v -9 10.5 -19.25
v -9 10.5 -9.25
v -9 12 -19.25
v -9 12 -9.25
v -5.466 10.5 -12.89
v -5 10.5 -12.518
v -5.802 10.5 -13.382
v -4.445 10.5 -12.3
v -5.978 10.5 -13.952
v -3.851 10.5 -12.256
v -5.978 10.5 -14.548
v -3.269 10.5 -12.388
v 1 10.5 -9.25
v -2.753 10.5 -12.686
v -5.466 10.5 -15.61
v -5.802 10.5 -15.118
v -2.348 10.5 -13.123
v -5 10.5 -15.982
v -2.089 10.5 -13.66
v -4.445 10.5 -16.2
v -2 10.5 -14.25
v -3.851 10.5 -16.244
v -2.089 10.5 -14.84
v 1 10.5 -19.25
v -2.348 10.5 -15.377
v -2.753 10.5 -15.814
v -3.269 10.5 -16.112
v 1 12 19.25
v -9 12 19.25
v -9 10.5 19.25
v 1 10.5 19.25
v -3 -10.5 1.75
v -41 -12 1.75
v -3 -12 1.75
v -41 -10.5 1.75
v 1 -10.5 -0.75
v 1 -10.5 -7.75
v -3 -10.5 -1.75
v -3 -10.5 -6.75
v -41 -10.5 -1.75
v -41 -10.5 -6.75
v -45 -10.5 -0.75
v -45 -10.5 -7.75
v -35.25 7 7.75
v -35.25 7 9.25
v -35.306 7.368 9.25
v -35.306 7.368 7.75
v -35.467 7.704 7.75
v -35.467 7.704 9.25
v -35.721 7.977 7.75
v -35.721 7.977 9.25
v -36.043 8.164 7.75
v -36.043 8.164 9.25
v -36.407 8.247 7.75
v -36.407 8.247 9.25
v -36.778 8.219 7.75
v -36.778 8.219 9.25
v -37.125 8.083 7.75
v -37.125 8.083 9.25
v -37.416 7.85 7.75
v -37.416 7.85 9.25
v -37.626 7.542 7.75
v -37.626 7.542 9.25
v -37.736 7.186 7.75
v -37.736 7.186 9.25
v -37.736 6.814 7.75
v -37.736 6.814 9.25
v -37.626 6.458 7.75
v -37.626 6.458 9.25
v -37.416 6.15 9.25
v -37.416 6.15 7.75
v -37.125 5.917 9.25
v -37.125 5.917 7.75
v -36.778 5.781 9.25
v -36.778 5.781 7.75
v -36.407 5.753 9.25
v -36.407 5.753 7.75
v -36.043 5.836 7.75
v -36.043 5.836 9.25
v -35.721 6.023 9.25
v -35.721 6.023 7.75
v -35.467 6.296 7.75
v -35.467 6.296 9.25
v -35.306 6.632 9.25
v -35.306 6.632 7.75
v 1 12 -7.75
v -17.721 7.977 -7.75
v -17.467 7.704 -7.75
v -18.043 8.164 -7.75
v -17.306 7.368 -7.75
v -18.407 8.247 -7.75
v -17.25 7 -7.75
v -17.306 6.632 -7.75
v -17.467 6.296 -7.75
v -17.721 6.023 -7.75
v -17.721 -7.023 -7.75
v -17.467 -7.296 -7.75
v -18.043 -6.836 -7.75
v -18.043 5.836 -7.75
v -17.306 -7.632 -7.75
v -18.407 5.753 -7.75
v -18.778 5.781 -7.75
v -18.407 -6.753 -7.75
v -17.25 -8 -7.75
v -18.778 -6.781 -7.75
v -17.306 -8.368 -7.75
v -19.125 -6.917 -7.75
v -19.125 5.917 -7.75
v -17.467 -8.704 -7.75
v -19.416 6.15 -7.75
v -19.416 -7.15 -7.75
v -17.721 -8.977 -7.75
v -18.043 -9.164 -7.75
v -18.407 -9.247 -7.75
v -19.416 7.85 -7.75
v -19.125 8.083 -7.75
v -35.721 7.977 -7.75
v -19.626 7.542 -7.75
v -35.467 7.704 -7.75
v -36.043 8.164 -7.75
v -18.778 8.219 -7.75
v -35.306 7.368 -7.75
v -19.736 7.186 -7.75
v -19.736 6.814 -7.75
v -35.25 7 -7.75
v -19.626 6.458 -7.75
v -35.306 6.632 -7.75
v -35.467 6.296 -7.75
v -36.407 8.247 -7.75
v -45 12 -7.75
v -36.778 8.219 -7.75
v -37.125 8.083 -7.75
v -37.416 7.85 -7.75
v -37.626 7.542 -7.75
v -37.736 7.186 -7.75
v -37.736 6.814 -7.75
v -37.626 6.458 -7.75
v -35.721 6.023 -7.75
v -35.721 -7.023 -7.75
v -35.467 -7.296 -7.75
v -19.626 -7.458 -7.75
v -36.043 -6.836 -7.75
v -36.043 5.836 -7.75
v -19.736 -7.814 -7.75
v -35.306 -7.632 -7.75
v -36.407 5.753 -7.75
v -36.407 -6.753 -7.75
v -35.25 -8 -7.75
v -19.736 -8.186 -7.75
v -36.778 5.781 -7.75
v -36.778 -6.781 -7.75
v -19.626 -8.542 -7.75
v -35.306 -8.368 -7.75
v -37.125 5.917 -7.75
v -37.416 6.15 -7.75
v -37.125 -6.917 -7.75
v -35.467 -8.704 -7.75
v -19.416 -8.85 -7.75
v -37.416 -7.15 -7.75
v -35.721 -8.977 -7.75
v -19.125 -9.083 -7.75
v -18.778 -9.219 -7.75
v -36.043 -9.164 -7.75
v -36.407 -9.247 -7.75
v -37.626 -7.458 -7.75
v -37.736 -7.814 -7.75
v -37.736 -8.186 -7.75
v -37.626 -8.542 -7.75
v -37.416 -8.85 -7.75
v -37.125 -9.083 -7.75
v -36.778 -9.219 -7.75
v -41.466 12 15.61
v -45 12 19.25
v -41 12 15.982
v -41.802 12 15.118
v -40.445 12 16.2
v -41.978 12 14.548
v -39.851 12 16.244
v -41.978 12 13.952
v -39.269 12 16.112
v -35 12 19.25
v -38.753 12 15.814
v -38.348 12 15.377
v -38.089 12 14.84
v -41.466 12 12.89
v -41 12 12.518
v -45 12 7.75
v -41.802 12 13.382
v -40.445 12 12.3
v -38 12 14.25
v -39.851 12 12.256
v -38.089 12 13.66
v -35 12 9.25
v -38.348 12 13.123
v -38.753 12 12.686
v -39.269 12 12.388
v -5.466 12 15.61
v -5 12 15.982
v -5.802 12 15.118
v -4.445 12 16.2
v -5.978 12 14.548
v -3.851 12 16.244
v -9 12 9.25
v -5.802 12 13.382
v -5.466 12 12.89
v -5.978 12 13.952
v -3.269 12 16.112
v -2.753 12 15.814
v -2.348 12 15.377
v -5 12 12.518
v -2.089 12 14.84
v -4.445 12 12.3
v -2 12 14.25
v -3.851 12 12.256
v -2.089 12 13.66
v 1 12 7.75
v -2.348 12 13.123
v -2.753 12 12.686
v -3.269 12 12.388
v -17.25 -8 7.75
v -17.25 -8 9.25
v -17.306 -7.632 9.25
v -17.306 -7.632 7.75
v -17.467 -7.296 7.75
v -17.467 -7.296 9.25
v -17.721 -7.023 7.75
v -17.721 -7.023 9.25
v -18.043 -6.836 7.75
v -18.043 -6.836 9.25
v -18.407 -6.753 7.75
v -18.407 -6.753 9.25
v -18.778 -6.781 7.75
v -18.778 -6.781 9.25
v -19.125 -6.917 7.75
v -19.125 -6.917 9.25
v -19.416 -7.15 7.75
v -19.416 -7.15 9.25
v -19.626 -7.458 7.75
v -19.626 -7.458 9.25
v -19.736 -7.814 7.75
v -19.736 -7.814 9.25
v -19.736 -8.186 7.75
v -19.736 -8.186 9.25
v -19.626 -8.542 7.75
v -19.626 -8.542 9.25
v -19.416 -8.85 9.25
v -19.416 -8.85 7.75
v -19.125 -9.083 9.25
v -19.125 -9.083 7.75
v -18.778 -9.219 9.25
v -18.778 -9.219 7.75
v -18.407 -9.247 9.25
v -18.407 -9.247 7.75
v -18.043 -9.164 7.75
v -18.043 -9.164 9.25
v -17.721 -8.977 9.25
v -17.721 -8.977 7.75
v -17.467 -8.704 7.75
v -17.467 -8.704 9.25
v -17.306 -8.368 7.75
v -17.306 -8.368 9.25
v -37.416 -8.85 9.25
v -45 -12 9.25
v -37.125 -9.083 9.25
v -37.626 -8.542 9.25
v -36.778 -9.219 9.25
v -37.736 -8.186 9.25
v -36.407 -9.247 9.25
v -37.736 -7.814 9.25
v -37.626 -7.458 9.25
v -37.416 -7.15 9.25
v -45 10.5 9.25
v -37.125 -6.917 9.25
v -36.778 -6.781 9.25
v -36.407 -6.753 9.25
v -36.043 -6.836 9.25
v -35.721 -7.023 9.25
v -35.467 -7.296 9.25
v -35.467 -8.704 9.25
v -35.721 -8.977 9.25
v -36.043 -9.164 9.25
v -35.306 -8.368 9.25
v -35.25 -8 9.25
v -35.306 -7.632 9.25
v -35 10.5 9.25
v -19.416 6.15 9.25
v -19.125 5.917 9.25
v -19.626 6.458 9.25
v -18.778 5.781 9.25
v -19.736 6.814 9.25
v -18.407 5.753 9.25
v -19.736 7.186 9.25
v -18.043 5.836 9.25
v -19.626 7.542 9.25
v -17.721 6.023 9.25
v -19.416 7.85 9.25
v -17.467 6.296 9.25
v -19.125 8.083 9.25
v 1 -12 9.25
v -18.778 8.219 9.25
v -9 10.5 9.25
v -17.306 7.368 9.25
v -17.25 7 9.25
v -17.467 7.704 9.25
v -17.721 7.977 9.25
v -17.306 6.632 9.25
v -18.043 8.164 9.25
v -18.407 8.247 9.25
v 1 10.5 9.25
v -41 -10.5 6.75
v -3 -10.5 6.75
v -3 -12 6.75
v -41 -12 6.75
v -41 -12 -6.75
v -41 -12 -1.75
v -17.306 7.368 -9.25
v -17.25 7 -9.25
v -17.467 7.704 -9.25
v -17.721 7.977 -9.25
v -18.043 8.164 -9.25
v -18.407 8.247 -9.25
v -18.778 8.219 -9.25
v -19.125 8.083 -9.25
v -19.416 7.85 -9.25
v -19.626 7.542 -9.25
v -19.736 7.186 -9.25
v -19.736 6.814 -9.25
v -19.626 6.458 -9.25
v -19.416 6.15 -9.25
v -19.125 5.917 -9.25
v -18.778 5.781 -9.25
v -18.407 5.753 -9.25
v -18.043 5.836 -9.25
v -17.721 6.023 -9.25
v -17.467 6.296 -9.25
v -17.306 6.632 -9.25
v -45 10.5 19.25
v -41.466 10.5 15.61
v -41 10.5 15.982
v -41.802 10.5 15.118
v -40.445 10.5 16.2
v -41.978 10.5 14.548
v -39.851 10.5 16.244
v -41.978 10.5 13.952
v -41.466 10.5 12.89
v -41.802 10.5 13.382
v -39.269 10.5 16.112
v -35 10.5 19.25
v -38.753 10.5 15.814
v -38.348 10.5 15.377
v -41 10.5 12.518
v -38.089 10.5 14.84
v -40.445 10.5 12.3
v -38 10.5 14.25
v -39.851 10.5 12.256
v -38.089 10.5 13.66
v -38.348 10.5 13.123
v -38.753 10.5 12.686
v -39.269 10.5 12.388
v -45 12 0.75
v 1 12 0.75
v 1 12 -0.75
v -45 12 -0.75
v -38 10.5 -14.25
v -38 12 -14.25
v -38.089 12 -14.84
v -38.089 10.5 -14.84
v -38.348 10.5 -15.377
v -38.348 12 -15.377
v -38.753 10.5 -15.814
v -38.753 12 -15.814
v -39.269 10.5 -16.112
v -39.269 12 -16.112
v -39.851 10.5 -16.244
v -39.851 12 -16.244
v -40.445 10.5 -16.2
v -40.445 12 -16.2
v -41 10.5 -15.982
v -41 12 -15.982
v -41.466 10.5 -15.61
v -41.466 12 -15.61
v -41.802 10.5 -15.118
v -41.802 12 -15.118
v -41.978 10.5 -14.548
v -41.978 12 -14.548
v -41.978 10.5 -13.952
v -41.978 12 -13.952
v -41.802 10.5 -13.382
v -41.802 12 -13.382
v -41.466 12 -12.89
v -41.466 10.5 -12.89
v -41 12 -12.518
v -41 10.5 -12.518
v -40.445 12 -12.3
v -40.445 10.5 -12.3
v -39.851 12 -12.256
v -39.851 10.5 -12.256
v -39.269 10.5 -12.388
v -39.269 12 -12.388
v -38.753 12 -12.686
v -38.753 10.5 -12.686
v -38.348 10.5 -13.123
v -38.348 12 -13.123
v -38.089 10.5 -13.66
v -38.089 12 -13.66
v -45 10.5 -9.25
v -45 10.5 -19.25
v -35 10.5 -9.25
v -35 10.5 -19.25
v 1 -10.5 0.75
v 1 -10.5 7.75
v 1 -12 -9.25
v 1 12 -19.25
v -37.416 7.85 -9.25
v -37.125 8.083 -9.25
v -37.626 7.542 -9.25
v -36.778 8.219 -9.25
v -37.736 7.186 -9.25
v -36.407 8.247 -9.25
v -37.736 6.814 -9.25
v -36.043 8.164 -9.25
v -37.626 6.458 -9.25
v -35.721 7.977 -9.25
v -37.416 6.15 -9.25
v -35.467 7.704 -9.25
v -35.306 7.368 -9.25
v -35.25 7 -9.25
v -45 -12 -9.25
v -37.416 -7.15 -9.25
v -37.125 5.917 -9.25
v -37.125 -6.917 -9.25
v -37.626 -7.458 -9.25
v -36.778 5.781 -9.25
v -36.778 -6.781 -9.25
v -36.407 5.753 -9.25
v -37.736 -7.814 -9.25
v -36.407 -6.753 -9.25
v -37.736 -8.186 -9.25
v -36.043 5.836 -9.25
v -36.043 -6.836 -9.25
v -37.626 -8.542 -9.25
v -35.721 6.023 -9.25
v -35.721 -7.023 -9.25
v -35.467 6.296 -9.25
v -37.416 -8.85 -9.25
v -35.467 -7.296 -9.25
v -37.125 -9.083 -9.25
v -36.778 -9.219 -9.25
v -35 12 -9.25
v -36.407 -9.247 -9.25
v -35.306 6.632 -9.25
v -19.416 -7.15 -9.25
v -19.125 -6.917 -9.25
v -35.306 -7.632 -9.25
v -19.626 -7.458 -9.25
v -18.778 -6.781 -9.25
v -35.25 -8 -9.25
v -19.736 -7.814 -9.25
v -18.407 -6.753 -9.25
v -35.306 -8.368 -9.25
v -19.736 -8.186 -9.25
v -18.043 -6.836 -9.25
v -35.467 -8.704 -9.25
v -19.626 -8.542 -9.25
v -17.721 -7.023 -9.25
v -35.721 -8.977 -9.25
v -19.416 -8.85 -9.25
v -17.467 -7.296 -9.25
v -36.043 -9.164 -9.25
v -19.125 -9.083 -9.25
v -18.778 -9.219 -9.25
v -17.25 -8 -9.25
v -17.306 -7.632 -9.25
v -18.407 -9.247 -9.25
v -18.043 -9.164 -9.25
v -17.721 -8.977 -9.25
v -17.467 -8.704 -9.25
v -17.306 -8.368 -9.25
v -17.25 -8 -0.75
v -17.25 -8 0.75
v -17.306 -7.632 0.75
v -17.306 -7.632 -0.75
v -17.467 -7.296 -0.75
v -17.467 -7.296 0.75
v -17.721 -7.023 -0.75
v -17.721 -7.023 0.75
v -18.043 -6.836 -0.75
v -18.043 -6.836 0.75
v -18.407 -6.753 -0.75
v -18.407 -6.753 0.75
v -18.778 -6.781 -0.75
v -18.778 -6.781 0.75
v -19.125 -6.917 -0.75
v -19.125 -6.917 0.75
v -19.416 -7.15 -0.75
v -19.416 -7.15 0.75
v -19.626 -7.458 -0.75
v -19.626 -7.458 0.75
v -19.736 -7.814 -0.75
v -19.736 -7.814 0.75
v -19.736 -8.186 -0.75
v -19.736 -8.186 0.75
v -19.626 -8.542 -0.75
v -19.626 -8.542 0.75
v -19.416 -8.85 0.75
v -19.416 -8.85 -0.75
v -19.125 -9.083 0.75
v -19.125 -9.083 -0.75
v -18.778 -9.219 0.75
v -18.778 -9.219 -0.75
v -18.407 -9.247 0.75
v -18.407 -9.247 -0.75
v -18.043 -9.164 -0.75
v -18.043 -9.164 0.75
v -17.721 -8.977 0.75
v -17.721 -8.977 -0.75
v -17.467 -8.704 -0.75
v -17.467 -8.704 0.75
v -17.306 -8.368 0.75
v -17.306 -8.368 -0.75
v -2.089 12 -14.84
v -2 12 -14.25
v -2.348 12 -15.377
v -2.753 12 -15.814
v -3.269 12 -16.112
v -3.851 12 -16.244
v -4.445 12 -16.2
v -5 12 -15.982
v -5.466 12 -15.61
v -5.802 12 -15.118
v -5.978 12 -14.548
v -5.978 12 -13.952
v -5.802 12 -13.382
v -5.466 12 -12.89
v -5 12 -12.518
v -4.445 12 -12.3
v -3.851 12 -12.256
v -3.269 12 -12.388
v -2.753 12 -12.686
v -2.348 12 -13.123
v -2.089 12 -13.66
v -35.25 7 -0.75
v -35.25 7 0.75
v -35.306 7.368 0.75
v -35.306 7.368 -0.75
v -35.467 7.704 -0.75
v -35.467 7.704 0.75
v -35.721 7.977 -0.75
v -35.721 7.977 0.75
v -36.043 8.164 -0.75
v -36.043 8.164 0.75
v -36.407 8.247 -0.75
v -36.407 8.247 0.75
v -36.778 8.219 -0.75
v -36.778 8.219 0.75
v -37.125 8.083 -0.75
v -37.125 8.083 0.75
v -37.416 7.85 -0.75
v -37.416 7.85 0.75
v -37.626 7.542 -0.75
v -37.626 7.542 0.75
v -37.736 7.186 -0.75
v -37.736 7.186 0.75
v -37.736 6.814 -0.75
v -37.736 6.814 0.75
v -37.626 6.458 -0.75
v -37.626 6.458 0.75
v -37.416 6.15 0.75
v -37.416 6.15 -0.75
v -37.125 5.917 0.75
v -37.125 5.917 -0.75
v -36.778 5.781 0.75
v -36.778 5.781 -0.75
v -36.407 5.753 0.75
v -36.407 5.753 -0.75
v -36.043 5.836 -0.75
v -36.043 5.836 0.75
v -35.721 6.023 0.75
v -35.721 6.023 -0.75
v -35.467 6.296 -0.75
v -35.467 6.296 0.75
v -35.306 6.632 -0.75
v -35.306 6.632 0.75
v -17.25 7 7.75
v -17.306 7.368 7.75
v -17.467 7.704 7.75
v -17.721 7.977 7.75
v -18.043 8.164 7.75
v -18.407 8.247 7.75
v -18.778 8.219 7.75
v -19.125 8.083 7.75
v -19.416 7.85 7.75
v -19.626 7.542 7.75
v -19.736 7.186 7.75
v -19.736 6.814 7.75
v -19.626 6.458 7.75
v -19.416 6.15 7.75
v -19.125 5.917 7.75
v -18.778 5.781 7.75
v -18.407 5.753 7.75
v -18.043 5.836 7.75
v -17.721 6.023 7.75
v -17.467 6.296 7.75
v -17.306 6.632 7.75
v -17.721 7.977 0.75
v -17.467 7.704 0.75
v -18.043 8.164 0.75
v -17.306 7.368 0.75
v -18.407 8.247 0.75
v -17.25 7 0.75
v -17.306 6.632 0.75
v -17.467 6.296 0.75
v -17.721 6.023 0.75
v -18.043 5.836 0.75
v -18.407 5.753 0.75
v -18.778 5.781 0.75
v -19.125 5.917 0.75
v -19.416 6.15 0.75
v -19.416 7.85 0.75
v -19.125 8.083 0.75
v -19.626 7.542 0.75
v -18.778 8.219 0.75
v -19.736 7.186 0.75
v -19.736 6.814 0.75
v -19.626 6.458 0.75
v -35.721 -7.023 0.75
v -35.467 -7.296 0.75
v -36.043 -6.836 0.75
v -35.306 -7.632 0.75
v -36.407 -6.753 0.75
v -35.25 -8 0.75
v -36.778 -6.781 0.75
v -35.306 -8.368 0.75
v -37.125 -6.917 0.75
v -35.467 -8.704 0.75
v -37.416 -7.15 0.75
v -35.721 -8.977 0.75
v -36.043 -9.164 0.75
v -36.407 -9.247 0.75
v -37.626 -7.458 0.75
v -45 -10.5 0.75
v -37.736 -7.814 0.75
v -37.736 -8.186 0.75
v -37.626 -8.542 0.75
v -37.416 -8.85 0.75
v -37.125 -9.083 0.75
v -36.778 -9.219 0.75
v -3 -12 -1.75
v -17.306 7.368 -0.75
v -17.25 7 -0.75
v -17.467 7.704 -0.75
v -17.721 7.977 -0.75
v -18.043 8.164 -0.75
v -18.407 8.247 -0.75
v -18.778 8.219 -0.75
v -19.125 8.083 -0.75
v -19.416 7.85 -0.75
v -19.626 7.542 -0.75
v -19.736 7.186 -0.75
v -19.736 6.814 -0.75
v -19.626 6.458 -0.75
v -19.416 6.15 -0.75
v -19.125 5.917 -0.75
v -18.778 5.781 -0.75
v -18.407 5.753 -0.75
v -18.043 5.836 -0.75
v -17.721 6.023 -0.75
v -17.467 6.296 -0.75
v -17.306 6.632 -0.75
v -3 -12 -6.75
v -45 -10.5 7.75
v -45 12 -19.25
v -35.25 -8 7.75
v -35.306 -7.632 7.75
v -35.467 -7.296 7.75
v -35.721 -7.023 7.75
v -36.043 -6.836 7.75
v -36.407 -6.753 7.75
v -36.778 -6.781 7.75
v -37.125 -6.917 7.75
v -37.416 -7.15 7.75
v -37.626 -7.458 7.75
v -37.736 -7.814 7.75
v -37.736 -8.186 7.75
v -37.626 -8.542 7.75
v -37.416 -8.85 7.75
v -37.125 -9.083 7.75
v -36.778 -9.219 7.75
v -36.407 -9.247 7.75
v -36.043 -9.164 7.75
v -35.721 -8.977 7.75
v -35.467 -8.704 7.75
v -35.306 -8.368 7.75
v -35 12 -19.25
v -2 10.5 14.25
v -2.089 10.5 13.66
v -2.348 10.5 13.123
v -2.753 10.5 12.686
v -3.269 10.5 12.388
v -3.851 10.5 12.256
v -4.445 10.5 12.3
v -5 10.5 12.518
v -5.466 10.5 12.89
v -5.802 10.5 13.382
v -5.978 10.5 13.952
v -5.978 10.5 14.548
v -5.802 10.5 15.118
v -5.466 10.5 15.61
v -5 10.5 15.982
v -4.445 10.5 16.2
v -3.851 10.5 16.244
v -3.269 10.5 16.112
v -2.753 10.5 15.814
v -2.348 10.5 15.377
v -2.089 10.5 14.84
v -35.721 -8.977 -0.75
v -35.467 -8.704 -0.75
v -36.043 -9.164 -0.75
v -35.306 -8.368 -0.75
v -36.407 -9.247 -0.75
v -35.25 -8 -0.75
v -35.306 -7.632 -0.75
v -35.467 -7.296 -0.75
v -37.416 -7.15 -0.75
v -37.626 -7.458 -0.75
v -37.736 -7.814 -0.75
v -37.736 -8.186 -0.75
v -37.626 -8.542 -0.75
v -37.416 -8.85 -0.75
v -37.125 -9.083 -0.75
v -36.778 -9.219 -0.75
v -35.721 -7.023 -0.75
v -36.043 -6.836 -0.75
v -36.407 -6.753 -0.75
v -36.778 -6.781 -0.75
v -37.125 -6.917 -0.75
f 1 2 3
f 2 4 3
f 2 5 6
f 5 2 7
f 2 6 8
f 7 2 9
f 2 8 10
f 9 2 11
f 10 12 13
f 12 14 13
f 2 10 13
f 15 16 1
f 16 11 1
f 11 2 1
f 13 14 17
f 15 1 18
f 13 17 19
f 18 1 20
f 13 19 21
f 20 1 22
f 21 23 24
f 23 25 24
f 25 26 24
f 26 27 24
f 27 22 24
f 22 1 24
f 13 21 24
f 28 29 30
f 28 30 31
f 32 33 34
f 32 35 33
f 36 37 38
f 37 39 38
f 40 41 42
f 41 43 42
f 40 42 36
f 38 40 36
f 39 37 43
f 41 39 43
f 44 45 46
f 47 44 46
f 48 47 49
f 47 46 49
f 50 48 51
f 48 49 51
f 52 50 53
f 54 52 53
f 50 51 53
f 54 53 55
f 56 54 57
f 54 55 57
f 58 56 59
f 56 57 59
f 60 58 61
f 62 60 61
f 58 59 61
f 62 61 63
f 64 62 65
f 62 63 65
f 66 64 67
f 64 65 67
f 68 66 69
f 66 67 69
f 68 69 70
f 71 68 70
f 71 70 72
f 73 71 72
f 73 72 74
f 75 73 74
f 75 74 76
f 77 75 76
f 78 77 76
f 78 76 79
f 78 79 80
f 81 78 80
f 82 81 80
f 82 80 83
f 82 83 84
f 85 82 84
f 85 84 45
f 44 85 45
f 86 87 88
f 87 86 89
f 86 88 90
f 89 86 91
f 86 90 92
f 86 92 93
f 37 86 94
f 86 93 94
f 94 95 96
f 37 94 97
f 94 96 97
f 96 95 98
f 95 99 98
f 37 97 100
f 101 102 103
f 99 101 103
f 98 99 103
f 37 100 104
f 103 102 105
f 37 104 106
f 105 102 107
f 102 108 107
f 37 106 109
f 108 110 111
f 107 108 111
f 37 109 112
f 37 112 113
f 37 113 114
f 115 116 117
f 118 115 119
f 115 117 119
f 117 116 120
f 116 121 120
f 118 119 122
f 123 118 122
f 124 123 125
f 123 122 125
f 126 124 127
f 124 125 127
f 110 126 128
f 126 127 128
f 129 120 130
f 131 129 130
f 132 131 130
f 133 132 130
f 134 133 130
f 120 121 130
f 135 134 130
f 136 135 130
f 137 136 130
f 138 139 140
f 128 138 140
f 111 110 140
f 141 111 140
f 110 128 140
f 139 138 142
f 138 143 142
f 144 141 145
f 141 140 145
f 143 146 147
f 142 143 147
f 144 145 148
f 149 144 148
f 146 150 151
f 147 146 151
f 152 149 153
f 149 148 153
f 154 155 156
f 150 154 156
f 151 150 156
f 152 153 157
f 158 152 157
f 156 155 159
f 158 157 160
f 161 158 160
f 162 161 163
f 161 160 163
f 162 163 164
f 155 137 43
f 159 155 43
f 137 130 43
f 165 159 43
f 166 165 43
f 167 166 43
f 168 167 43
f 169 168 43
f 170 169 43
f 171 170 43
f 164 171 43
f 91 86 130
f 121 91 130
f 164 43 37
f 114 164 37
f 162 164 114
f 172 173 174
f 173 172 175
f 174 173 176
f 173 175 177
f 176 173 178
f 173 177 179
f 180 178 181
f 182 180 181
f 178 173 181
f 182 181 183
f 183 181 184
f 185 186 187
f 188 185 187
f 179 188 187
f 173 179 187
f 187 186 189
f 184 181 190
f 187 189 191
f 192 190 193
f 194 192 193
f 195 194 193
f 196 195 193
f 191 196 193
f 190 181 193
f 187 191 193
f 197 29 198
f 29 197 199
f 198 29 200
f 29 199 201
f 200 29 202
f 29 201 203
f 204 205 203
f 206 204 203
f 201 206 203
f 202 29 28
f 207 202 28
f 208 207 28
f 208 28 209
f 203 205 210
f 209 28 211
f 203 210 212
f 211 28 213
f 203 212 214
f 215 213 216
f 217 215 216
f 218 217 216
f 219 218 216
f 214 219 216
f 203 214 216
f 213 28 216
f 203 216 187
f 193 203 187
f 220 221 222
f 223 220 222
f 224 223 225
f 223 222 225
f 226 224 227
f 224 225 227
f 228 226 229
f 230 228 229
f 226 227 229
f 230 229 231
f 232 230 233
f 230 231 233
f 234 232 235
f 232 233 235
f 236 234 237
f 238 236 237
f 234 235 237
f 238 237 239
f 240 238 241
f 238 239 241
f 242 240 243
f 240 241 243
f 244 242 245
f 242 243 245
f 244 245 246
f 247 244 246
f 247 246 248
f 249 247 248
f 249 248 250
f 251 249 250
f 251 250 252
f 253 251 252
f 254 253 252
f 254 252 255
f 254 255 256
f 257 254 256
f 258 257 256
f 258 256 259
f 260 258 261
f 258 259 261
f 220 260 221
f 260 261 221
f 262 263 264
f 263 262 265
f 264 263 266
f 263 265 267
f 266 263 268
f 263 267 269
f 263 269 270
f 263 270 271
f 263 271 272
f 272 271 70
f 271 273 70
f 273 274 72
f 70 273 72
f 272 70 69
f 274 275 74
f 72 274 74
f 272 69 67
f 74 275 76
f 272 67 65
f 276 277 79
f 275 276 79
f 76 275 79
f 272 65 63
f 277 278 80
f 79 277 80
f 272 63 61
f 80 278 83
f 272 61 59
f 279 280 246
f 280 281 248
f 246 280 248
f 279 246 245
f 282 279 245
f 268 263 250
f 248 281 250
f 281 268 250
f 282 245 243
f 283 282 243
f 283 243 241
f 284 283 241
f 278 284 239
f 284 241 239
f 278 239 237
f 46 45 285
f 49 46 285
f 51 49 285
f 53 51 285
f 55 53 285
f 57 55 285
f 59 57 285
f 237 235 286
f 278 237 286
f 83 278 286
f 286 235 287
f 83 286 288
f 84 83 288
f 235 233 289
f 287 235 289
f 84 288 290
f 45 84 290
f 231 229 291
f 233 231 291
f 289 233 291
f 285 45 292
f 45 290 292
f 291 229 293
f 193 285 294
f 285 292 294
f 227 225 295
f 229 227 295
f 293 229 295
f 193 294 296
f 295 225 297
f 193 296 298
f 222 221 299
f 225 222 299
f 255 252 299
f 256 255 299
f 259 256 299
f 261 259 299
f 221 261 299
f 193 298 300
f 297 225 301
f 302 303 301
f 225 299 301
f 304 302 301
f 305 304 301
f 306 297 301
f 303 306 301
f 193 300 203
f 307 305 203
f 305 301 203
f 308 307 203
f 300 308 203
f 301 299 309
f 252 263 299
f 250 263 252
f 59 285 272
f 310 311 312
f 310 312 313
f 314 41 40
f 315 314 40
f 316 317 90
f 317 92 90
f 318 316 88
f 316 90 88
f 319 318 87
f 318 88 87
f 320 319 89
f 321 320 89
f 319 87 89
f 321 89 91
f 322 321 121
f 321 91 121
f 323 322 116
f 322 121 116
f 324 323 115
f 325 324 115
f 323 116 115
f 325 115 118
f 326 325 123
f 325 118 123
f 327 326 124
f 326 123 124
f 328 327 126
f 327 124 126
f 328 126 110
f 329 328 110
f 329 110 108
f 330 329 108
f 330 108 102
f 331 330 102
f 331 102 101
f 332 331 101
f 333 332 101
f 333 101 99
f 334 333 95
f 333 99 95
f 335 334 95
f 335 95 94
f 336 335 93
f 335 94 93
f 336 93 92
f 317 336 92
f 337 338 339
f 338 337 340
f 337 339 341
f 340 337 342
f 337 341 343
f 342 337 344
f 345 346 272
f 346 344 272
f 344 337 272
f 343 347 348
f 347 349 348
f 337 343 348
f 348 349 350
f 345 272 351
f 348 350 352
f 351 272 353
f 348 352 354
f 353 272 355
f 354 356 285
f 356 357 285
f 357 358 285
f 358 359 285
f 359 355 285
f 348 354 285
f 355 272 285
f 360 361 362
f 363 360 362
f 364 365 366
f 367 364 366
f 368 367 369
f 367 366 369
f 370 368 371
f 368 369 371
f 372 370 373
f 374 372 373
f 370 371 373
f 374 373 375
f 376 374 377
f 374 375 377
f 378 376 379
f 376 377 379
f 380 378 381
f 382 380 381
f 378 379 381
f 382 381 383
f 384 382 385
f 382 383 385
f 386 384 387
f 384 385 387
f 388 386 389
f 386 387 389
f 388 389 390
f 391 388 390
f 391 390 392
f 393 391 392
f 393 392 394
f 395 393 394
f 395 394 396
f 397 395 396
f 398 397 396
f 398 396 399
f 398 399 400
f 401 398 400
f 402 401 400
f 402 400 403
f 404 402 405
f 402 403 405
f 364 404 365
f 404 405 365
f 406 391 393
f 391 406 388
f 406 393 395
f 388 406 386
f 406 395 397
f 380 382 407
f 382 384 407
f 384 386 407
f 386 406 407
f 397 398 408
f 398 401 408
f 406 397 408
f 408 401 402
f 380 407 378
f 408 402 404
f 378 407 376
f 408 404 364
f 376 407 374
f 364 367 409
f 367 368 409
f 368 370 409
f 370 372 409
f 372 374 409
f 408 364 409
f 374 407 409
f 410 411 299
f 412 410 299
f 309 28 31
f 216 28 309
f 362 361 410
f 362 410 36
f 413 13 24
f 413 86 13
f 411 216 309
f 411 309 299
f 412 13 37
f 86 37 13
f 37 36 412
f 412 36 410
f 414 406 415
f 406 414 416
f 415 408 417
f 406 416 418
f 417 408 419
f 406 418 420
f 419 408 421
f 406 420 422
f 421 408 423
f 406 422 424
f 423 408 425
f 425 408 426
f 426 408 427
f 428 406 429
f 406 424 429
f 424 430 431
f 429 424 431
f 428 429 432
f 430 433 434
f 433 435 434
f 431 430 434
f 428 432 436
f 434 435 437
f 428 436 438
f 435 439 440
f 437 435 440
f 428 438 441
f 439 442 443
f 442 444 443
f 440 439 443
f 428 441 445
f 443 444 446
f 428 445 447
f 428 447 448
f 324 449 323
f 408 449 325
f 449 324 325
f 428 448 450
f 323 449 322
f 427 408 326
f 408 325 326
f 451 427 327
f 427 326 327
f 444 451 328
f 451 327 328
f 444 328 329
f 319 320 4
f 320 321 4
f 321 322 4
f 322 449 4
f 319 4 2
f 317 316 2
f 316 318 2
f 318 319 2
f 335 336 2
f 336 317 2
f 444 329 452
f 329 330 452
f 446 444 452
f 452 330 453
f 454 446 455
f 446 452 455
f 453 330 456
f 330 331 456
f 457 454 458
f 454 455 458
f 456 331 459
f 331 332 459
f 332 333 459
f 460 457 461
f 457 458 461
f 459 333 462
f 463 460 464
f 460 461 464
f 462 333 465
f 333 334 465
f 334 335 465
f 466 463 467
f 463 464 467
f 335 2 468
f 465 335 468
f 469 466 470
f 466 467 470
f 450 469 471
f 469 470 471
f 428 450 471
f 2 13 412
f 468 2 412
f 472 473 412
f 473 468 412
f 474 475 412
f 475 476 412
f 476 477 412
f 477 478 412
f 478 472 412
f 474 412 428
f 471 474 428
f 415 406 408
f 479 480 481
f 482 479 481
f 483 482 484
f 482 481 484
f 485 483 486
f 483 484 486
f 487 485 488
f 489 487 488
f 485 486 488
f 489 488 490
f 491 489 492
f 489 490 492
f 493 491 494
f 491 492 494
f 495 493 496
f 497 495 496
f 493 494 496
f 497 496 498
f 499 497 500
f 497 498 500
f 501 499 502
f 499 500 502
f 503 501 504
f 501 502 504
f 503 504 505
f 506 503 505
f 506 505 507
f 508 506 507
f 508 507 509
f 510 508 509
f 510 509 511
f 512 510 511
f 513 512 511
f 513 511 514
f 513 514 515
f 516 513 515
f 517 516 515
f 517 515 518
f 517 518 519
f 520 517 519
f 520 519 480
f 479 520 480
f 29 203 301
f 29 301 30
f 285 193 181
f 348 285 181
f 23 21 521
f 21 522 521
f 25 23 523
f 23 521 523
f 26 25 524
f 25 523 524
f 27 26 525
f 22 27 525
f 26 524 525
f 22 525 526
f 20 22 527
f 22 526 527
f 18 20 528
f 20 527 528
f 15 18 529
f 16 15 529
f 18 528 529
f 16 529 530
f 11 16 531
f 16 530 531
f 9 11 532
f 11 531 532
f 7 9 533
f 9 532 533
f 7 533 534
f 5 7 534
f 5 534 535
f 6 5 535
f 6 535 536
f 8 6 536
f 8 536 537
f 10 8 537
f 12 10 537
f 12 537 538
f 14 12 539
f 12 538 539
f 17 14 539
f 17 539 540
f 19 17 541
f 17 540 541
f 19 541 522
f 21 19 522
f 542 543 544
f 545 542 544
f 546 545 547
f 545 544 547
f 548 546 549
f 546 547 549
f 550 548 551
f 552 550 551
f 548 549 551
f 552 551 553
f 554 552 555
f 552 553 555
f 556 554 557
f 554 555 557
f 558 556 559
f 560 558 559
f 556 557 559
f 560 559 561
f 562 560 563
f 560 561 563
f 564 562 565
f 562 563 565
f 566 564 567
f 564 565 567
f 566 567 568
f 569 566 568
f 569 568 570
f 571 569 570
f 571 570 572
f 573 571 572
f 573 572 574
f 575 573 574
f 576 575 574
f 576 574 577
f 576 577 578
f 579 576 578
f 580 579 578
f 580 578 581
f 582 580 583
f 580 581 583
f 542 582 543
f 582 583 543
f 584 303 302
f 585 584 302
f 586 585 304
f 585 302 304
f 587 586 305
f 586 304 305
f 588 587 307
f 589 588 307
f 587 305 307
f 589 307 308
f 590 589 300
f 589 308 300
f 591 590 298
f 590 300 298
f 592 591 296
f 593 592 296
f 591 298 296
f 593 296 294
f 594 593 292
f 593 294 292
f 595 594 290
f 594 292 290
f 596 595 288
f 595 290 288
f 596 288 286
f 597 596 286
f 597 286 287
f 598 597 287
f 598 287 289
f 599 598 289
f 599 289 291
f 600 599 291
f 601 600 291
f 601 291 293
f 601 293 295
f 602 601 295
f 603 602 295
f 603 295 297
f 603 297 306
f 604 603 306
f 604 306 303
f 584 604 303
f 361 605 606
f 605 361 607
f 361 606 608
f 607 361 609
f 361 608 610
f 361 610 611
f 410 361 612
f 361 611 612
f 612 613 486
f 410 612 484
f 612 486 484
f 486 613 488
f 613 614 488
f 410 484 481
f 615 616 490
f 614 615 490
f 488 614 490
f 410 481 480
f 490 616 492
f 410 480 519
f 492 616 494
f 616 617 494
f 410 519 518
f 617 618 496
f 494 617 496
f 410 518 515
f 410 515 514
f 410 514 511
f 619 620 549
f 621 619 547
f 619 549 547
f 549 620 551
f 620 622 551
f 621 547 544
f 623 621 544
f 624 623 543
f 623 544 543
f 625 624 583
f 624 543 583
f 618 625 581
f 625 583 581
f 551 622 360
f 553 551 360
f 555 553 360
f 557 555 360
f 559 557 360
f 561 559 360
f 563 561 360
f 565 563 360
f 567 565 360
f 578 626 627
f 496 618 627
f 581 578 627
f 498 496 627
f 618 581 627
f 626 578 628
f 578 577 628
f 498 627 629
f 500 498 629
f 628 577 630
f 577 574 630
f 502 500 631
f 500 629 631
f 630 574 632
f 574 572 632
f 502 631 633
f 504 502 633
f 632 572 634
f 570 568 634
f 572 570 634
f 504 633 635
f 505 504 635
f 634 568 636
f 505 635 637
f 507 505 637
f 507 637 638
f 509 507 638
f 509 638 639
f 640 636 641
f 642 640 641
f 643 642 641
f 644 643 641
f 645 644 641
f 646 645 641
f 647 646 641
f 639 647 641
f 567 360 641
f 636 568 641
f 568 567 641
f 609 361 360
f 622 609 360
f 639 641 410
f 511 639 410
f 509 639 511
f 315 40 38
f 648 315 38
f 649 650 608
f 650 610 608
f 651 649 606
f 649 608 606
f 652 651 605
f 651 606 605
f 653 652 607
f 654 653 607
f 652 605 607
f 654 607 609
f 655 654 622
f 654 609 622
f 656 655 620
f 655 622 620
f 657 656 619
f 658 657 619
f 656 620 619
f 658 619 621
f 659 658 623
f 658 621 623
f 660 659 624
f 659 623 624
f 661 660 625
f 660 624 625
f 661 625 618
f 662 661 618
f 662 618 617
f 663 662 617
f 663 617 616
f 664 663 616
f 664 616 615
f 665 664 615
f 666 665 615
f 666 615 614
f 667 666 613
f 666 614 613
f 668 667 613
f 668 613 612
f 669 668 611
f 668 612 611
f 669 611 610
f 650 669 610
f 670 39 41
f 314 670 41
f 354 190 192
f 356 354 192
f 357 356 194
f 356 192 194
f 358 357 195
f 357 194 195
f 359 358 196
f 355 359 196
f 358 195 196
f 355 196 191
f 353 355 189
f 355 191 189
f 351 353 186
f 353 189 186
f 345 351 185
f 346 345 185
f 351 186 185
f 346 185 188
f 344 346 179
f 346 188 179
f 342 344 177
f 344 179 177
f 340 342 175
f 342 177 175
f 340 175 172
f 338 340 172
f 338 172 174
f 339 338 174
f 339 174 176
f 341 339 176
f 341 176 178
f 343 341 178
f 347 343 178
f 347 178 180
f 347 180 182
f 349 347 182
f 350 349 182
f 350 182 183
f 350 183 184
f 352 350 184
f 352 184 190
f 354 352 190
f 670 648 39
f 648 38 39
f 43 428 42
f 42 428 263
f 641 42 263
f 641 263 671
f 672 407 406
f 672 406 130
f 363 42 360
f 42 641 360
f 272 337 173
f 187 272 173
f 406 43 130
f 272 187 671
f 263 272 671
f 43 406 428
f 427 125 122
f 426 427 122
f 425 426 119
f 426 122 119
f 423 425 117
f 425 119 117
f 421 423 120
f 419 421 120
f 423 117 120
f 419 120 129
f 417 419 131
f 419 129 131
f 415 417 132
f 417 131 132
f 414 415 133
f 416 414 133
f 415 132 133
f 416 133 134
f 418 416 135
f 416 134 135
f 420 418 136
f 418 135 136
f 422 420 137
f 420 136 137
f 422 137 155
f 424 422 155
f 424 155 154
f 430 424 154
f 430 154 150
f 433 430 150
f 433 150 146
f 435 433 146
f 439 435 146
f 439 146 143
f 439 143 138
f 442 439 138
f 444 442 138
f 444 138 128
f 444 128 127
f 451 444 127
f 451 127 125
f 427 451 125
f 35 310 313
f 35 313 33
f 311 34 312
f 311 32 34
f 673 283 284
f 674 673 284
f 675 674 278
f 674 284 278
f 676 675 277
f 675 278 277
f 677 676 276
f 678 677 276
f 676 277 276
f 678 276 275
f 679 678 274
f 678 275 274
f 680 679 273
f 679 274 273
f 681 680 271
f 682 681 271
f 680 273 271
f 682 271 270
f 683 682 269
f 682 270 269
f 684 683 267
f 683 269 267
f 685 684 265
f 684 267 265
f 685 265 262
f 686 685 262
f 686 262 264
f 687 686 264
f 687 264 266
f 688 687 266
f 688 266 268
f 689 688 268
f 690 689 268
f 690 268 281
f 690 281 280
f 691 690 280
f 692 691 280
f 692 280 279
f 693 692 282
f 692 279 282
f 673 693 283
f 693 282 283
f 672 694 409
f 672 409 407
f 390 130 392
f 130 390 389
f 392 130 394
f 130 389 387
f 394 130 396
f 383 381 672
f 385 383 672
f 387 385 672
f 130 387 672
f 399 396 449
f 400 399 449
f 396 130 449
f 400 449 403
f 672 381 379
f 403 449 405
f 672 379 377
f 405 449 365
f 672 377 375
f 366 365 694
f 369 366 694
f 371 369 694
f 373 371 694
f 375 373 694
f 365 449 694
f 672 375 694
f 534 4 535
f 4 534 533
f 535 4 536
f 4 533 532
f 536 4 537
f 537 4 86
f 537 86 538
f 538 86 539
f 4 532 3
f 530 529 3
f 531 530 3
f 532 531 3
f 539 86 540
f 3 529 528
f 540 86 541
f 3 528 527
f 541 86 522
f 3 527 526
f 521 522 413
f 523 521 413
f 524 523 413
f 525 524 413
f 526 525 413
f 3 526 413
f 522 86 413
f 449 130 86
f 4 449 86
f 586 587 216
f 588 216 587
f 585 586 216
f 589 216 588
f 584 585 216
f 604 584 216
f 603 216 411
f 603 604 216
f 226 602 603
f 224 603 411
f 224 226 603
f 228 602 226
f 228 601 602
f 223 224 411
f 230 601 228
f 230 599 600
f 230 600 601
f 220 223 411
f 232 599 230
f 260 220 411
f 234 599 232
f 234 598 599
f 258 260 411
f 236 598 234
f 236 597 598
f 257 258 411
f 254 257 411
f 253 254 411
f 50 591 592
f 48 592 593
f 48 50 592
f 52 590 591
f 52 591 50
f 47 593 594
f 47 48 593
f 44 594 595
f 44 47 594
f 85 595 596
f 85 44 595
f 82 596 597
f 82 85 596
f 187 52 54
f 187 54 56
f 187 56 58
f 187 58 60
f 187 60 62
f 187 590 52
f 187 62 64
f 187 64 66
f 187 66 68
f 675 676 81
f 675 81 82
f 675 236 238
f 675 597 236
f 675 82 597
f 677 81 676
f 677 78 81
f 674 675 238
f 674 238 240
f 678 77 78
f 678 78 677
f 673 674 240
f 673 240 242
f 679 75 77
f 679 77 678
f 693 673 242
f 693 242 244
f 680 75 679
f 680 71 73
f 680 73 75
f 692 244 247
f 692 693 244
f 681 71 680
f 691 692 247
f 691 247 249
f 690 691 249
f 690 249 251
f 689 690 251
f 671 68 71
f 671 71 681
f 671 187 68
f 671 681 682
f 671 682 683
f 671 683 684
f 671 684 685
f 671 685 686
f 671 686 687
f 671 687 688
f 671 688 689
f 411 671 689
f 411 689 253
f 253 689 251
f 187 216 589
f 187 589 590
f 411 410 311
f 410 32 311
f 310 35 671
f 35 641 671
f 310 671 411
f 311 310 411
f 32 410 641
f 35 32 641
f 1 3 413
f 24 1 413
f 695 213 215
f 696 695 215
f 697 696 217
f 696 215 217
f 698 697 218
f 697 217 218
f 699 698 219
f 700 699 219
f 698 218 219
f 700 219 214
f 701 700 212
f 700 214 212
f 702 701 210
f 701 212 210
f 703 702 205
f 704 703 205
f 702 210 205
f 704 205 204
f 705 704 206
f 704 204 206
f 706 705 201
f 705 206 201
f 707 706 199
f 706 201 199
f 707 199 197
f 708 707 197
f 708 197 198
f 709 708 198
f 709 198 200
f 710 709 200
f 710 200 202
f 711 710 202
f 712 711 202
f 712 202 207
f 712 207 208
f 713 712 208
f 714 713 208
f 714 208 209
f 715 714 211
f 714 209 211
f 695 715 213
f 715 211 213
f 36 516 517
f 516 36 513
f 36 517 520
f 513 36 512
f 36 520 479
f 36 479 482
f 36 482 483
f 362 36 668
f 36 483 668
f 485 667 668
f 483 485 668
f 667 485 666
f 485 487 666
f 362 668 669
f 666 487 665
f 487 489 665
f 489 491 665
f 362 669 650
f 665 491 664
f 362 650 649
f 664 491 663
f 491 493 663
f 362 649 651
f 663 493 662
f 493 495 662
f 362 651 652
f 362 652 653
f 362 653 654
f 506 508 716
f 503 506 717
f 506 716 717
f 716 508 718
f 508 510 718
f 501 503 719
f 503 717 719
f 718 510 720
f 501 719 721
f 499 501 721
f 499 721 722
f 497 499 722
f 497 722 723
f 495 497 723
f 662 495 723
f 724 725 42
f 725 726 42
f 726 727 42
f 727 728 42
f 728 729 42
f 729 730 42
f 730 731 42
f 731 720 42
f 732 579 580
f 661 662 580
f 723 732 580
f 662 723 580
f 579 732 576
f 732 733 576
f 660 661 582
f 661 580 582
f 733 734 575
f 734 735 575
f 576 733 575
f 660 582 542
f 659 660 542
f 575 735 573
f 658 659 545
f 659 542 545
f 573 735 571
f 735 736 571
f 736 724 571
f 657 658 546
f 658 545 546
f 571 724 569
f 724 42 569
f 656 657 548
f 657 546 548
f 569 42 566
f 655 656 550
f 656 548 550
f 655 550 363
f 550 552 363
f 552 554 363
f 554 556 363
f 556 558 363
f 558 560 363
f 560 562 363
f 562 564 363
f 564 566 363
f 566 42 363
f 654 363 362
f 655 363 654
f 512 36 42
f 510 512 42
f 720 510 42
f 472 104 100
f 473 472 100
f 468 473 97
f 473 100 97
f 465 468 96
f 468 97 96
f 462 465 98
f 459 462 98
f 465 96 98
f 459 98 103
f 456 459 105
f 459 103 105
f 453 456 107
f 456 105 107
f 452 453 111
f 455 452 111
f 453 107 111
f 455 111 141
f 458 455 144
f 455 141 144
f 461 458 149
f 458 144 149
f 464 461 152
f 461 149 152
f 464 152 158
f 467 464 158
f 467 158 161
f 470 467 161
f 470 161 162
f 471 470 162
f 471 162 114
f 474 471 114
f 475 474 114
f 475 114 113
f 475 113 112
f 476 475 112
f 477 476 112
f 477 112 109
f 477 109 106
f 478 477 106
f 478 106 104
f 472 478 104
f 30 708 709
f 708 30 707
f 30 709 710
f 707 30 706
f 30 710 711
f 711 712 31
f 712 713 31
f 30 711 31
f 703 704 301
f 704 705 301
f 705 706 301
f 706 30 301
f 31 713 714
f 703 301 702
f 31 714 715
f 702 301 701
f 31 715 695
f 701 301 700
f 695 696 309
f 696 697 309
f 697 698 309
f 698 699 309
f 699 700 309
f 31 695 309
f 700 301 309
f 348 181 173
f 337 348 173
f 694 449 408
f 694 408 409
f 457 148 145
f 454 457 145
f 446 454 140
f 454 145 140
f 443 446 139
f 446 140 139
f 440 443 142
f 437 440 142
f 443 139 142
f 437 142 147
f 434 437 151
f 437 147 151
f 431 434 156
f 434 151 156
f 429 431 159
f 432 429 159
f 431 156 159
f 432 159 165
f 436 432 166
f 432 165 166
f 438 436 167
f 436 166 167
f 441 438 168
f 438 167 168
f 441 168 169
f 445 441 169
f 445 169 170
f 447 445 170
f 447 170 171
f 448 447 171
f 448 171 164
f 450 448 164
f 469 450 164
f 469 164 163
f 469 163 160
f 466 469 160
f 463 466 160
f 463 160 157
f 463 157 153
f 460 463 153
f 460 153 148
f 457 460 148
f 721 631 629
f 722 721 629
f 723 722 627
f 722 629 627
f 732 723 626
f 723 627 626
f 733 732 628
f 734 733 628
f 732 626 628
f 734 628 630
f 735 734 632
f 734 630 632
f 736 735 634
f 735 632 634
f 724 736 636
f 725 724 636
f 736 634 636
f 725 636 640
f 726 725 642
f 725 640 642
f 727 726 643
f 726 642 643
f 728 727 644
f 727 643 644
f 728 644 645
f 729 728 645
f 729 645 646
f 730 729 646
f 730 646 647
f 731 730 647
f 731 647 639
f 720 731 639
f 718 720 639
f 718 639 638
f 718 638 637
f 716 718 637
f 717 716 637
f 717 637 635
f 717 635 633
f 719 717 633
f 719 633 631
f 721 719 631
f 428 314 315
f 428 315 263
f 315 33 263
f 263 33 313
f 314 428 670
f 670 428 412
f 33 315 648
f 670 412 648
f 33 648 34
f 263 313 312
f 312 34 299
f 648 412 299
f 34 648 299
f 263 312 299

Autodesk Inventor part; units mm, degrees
ref_plane "YZ Plane" through (0, 0, 0) normal (1, 0, 0) x (0, 1, 0)
ref_plane "XZ Plane" through (0, 0, 0) normal (0, 1, 0) x (-1, 0, 0)
ref_plane "XY Plane" through (0, 0, 0) normal (0, 0, 1) x (1, 0, 0)
sketch "스케치1" plane through (0, 0, 0) normal (1, 0, 0) x (0, 1, 0)
  line L0 (12, -9.25) -> (-12, -9.25)
  line L1 (-12, -9.25) -> (-12, 9.25)
  line L2 (-12, 9.25) -> (12, 9.25)
  line L3 (12, 9.25) -> (12, -9.25)
  line L4 (12, -9.25) -> (-12, 9.25) construction
  line L5 (-12, -9.25) -> (12, 9.25) construction
  line L6 (12, 7.75) -> (-10.5, 7.75)
  line L7 (-10.5, 7.75) -> (-10.5, 0.75)
  line L8 (-10.5, 0.75) -> (12, 0.75)
  line L9 (12, 0.75) -> (12, 7.75)
  line L10 (-10.5, -7.75) -> (12, -7.75)
  line L11 (-10.5, -0.75) -> (-10.5, -7.75)
  line L12 (12, -0.75) -> (-10.5, -0.75)
  line L13 (12, 9.25) -> (13.5, 9.25)
  line L14 (13.5, 9.25) -> (13.5, -9.25)
  line L15 (13.5, -9.25) -> (12, -9.25)
  line L16 (12, -9.25) -> (12, 9.25)
  point P0 (0, 0)
  point P1 (12, -7.75)
  point P2 (12, -0.75)
  point P3 (-10, 7.75)
  point P4 (-10, -7.75)
  point P5 (-10, 0.75)
  point P6 (-10, -0.75)
  point P7 (-10, -0.75)
  point P8 (-10, -7.75)
  point P9 (12, 7.75)
  point P10 (12, -7.75)
  dimension "d0" = 24
  dimension "d1" = 18.5
  dimension "d2" = 22.5
  dimension "d3" = 7
  dimension "d4" = 1.5
  dimension "d7" = 8.5
  dimension "d18" = 1.5
extrude "돌출1" add sketch "스케치1" against normal blind 45 contours L0 L1 L2 L3 L6 L7 L8 L12 L11 L10
sketch "스케치2" plane through (0, 0, 0) normal (1, 0, 0) x (0, 0, -1)
  line L0 (-9.25, -12) -> (9.25, -12) projected
  line L1 (-9.25, 12) -> (-9.25, -12) projected
  line L2 (-9.25, 12) -> (9.25, 12)
  line L3 (9.25, 12) -> (9.25, -12)
  line L4 (9.25, -12) -> (-9.25, -12)
  line L5 (-9.25, -12) -> (-9.25, 12)
  line L6 (9.25, 12) -> (-9.25, 12)
  line L7 (-9.25, 12) -> (-7.75, 12) projected
  point P0 (0, 0)
extrude "돌출2" add sketch "스케치2" along normal blind 1
sketch "스케치4" plane through (-45, -12, 9.25) normal (0, 0, 1) x (1, 0, 0)
  circle A0 centre (8.5, 19) radius 1.25 projected
  circle A1 centre (26.5, 19) radius 1.25 projected
  circle A2 centre (26.5, 4) radius 1.25 projected
  circle A3 centre (8.5, 4) radius 1.25 projected
  point P0 (45, 12)
extrude "돌출3" cut sketch "스케치4" against normal blind 45
sketch "스케치9" plane through (0, 12, 7.75) normal (0, 1, 0) x (1, 0, 0)
  line L0 (-45, 7) -> (-45, 8.5) projected
  line L1 (0, 7) -> (-45, 7) projected
  line L2 (-45, -1.5) -> (1, -1.5) projected
  line L3 (-45, 17) -> (1, 17) projected
  line L4 (-45, 17) -> (-35, 17)
  line L5 (-45, -1.5) -> (-35, -1.5)
  line L6 (-35, -1.5) -> (-35, -11.5)
  line L7 (-35, -11.5) -> (-45, -11.5)
  line L8 (-45, -11.5) -> (-45, -1.5)
  circle A0 centre (-40, -6.5) radius 2
  line L9 (-45, 7.75) -> (0, 7.75) construction
  line L10 (-22, -1.5) -> (-22, 17) construction
  line L11 (-35, 17) -> (-35, 27)
  line L12 (-35, 27) -> (-45, 27)
  line L13 (-45, 27) -> (-45, 17)
  circle A1 centre (-40, 22) radius 2
  line L14 (-45, 17) -> (-35, 17)
  line L15 (1, 17) -> (-9, 17)
  line L16 (1, -1.5) -> (-9, -1.5)
  line L17 (-9, -1.5) -> (-9, -11.5)
  line L18 (-9, -11.5) -> (1, -11.5)
  line L19 (1, -11.5) -> (1, -1.5)
  circle A2 centre (-4, -6.5) radius 2
  circle A3 centre (-4, 22) radius 2
  line L20 (-9, 17) -> (-9, 27)
  line L21 (-9, 27) -> (1, 27)
  line L22 (1, 27) -> (1, 17)
  line L23 (1, 17) -> (-9, 17)
  point P0 (-9, 17)
  dimension "d31" = 10
  dimension "d32" = 10
  dimension "d33" = 4
  dimension "d34" = 5
  dimension "d35" = 5
extrude "돌출6" add sketch "스케치9" against normal blind 1.5
sketch "스케치10" plane through (0, 0, 0) normal (-1, 0, 0) x (0, 0, 1)
  line L0 (-0.75, -10.5) -> (-0.75, 12) projected
  line L1 (-7.75, 12) -> (-0.75, 12) projected
  line L2 (-7.75, 12) -> (-7.75, -10.5) projected
  line L3 (-7.75, -10.5) -> (-0.75, -10.5) projected
  line L4 (1.75, 9.5) -> (1.75, -10.5) projected
  line L5 (1.75, -10.5) -> (7.75, -10.5) projected
  line L6 (7.75, 9.5) -> (7.75, -10.5) projected
  line L7 (1.75, 9.5) -> (7.75, 9.5) projected
  line L8 (0.75, 12) -> (0.75, -10.5) projected
  line L9 (0.75, -10.5) -> (7.75, -10.5) projected
  line L10 (7.75, -10.5) -> (7.75, 12) projected
  line L11 (0.75, 12) -> (7.75, 12) projected
  point P0 (0, 0)
  point P1 (1.75, -10.5)
  point P2 (1.75, 10.75)
  point P3 (7.75, 9.5)
extrude "돌출7" cut sketch "스케치10" against normal blind 10
sketch "스케치11" plane through (-45, -10.5, 7.75) normal (0, 1, 0) x (1, 0, 0)
  line L0 (0, 15.5) -> (46, 15.5) projected
  line L1 (0, 8.5) -> (0, 15.5) projected
  line L2 (46, 15.5) -> (46, 8.5) projected
  line L3 (0, 8.5) -> (0, 7)
  line L4 (46, 8.5) -> (0, 8.5) projected
  line L5 (46, 8.5) -> (46, 7)
  line L6 (0, 7.75) -> (46, 7.75) construction
  line L7 (23, 15.5) -> (23, 8.5) construction
  line L8 (0, 12) -> (46, 12) construction
  line L9 (4, 9.5) -> (42, 9.5)
  line L10 (42, 9.5) -> (42, 14.5)
  line L11 (42, 14.5) -> (4, 14.5)
  line L12 (4, 14.5) -> (4, 9.5)
  line L13 (4, 9.5) -> (42, 14.5) construction
  line L14 (42, 9.5) -> (4, 14.5) construction
  line L15 (4, 6) -> (42, 6)
  line L16 (42, 6) -> (42, 1)
  line L17 (42, 1) -> (4, 1)
  line L18 (4, 1) -> (4, 6)
  line L19 (0, 7.75) -> (46, 7.75) construction
  line L20 (0, 8.5) -> (46, 8.5) projected
  point P0 (45, 7.75)
  point P1 (23, 12)
  dimension "d40" = 1
  dimension "d41" = 4
extrude "돌출8" cut sketch "스케치11" against normal blind 10 contours L12 L11 L10 L9 | L15 L16 L17 L18
properties part number "convertor_base" material "고무, 검은색"
